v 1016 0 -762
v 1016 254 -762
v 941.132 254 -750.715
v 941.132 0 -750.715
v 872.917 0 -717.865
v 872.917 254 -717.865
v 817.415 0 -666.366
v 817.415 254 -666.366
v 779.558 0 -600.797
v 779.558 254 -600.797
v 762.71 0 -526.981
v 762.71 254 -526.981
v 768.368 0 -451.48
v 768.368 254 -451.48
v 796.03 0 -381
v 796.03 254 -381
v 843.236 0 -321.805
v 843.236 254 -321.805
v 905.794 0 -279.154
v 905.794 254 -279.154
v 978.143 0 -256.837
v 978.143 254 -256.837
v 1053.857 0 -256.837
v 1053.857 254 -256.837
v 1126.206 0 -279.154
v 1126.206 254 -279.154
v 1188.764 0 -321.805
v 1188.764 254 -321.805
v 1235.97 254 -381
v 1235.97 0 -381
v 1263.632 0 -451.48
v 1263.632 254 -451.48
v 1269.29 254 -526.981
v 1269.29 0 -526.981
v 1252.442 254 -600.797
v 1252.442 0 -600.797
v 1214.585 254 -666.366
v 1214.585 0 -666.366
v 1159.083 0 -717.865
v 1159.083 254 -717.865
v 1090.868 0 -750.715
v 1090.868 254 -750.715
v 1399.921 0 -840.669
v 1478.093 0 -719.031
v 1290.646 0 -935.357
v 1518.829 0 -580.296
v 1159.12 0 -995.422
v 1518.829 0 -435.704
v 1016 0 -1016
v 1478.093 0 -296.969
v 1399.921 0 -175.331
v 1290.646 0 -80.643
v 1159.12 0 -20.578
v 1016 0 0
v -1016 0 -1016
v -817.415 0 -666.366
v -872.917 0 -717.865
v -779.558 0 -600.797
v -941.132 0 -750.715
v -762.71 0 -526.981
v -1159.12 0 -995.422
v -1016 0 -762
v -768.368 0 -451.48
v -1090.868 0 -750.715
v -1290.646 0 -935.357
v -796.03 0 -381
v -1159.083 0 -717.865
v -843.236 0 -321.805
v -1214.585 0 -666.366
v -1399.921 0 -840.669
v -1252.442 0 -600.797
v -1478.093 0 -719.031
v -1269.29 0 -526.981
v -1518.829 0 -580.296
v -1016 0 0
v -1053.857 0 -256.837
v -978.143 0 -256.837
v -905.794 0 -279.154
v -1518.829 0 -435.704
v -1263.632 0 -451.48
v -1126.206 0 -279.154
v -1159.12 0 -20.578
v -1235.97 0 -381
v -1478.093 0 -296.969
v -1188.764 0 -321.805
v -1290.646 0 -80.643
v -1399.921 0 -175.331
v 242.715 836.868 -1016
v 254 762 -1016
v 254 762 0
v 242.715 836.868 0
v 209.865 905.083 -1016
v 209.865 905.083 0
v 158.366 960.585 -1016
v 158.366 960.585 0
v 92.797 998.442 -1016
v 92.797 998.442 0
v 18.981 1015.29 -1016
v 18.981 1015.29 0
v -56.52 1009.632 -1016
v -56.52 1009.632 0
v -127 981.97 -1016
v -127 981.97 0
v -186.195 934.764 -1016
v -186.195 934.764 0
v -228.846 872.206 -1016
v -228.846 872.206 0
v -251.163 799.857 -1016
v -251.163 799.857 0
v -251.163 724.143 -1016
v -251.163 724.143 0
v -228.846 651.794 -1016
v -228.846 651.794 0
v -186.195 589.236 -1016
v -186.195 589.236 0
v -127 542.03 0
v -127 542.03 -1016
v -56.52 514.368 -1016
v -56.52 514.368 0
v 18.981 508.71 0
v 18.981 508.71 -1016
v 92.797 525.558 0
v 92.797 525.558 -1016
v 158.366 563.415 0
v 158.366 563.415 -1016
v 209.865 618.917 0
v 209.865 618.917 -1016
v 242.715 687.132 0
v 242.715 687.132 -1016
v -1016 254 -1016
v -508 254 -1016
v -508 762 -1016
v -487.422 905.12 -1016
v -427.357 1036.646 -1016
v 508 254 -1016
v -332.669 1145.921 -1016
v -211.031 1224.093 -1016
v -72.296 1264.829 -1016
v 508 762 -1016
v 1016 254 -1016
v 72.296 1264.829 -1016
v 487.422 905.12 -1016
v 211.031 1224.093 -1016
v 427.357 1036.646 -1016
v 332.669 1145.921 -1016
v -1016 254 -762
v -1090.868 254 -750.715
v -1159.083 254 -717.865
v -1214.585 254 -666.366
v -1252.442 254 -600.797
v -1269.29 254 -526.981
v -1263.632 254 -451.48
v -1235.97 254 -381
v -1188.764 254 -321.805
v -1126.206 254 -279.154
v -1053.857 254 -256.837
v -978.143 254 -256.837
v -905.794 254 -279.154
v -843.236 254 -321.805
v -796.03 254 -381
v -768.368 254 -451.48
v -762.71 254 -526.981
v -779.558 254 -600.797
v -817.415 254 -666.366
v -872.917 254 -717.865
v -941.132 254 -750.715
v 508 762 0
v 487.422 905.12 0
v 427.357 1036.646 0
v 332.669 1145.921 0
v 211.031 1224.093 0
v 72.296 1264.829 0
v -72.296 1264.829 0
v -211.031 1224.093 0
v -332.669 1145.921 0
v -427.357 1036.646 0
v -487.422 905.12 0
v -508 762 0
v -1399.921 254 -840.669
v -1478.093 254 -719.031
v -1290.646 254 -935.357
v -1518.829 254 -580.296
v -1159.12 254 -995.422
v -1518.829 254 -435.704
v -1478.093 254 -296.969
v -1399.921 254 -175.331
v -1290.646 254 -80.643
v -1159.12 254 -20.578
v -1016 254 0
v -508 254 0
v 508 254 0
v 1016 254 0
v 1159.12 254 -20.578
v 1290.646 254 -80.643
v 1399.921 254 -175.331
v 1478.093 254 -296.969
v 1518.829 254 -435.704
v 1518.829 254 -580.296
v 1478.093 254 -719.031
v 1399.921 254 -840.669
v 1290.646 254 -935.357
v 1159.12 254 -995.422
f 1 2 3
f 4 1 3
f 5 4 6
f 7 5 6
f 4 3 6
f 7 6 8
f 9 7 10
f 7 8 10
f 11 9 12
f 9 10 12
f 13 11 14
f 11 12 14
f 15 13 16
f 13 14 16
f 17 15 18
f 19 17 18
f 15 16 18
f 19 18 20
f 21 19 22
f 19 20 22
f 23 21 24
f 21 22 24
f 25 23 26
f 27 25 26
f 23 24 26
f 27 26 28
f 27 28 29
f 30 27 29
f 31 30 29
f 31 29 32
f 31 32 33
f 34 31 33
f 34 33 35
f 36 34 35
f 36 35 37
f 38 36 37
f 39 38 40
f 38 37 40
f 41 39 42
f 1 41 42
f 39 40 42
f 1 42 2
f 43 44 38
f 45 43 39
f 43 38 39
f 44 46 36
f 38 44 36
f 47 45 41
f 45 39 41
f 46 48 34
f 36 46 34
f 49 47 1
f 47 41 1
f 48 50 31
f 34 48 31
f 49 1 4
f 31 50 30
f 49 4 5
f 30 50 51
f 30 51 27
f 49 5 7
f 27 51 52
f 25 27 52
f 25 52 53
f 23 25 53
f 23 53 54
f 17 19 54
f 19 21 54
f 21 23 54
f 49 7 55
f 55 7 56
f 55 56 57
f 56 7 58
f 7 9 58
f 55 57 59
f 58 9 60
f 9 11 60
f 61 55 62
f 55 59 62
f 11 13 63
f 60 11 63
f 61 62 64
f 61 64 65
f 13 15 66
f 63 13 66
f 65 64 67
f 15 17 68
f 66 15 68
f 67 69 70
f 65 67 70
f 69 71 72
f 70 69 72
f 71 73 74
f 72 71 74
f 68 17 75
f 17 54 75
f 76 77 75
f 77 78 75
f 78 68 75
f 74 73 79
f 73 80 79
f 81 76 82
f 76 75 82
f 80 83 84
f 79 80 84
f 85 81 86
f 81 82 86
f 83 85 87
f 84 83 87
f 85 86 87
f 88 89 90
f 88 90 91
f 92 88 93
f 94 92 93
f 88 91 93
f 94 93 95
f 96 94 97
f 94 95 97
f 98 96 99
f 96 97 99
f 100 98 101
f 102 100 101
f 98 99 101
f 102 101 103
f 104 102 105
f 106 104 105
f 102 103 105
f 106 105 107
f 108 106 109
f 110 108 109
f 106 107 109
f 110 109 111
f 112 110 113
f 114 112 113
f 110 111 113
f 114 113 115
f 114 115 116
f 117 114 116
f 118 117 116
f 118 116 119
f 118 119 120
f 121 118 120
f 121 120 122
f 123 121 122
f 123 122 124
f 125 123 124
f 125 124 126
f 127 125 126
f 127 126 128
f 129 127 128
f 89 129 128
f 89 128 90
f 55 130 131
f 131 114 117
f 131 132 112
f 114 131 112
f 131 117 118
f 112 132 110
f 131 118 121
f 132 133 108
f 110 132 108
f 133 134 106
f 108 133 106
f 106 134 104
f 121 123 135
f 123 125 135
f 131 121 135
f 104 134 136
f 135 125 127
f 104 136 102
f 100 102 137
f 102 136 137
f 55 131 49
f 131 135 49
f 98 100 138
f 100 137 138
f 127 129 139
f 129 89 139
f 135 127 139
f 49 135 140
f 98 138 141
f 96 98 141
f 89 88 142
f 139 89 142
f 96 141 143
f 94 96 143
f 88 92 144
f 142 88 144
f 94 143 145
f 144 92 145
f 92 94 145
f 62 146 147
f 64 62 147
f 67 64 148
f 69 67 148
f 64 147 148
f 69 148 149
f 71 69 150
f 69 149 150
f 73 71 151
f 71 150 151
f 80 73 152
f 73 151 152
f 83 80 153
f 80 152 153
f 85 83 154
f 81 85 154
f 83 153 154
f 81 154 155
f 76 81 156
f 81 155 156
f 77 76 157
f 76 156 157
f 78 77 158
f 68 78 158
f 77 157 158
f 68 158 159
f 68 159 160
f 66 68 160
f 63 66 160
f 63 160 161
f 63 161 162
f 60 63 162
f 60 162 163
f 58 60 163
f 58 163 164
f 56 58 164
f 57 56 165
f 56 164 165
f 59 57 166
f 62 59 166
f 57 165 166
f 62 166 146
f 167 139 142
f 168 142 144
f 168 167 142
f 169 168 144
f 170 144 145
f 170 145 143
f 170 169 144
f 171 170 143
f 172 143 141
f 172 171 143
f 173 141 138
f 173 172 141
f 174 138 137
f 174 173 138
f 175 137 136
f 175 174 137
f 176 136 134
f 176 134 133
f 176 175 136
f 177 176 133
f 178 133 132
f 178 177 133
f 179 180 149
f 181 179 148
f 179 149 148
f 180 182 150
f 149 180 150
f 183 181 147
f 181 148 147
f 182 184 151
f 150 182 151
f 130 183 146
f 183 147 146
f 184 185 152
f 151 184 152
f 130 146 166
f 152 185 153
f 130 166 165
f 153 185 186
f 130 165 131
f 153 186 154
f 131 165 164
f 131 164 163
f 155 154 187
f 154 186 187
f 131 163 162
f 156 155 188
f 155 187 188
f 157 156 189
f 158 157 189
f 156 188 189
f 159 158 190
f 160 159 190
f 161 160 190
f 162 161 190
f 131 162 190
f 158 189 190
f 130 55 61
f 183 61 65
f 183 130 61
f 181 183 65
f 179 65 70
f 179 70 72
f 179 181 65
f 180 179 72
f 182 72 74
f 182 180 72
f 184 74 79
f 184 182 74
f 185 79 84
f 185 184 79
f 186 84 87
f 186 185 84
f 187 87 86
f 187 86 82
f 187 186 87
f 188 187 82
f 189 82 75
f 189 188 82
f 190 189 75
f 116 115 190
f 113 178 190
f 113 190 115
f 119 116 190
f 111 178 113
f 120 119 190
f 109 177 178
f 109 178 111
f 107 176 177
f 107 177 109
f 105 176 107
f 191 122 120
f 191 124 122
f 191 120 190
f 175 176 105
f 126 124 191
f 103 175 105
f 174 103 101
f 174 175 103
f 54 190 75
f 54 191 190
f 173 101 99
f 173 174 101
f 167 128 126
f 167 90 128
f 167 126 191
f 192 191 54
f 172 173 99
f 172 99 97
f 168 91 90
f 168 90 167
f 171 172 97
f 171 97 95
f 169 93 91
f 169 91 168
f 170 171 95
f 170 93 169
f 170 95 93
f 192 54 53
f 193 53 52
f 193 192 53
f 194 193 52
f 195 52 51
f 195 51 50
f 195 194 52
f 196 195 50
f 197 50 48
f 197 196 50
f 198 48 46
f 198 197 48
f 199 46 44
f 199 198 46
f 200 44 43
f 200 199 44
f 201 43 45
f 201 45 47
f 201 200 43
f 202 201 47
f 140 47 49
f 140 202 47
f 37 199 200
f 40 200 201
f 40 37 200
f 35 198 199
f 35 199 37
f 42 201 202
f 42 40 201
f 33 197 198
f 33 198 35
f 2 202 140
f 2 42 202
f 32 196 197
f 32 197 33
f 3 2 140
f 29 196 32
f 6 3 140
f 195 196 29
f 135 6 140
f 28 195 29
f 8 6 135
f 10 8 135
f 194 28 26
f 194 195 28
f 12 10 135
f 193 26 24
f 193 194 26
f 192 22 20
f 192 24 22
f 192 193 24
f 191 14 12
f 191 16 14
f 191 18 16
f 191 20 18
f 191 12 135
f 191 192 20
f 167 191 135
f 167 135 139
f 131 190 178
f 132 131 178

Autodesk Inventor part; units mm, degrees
ref_plane "YZ Plane" through (0, 0, 0) normal (1, 0, 0) x (0, 1, 0)
ref_plane "XZ Plane" through (0, 0, 0) normal (0, 1, 0) x (-1, 0, 0)
ref_plane "XY Plane" through (0, 0, 0) normal (0, 0, 1) x (1, 0, 0)
sketch "Sketch1" plane through (0, 0, 0) normal (0, 0, 1) x (1, 0, 0)
  line L0 (1016, 0) -> (-1016, 0)
  line L1 (-1016, 0) -> (-1016, 254)
  line L2 (-1016, 0) -> (-762, 0) construction
  line L3 (-1016, 254) -> (-508, 254)
  line L4 (-508, 254) -> (-508, 762)
  line L5 (1016, 0) -> (1016, 254)
  line L6 (1016, 254) -> (508, 254)
  line L7 (508, 254) -> (508, 762)
  arc A0 (508, 762) -> (-508, 762) centre (0, 762) ccw
  circle A1 centre (0, 762) radius 254
  point P0 (0, 0)
  dimension "d7" = 2032
  dimension "d8" = 254
  dimension "d10" = 508
  dimension "d12" = 508
  dimension "d19" = 254
  dimension "d20" = 508
  dimension "d21" = 508
  dimension "d22" = 508
extrude "Extrusion1" add sketch "Sketch1" against normal blind 1016 contours L0 L1 L3 L4 A0 L7 L6 L5 | A1
sketch "Sketch2" plane through (0, 0, 0) normal (0, 0, 1) x (1, 0, 0)
  arc A0 (508, 762) -> (-508, 762) centre (0, 762) ccw projected
  circle A1 centre (0, 762) radius 254
  point P0 (0, 0)
  dimension "d25" = 508
extrude "Extrusion2" cut sketch "Sketch2" against normal blind 1016
sketch "Sketch3" plane through (508, 254, 0) normal (0, 1, 0) x (1, 0, 0)
  line L0 (-1524, 0) -> (-1524, 1016) projected
  arc A0 (-1524, 1016) -> (-1524, 0) centre (-1524, 508) ccw
  line L1 (508, 0) -> (508, 1016) projected
  arc A1 (508, 0) -> (508, 1016) centre (508, 508) ccw
  circle A2 centre (-1524, 508) radius 254
  circle A3 centre (508, 508) radius 254
  point P0 (-508, 0)
  point P1 (508, 762)
  point P2 (508, 254)
  point P3 (-1524, 254)
  point P4 (-1524, 762)
  dimension "d28" = 508
  dimension "d29" = 508
extrude "Extrusion3" add sketch "Sketch3" against normal blind 254 contours A0 L0 A2 | L1 A3 A1
sketch "Sketch4" plane through (-508, 254, 0) normal (0, 1, 0) x (1, 0, 0)
  line L0 (-508, 254) -> (-508, 762) projected
  circle A0 centre (-508, 508) radius 254
  line L1 (1524, 254) -> (1524, 762) projected
  arc A1 (1524, 254) -> (1524, 762) centre (1524, 508) ccw projected
  circle A2 centre (1524, 508) radius 254
  point P0 (508, 0)
extrude "Extrusion4" cut sketch "Sketch4" against normal blind 254 contours L0 A0 | A2 L1 picked at (-364.7512, 468.4995)
equation "\"BendRadius\" = Thickness"
equation "\"BendReliefWidth\" = Thickness"
equation "\"BendReliefDepth\" = 0.5 * Thickness"
equation "\"CornerReliefSize\" = 4 * Thickness"
equation "\"MinimumRemnant\" = 2 * Thickness"
equation "\"TransitionRadius\" = BendRadius"
equation "\"JacobiRadiusSize\" = BendRadius"
equation "\"GapSize\" = Thickness"
equation "\"Thickness\" = 3.048"
properties part number "LAB1LLCT"
